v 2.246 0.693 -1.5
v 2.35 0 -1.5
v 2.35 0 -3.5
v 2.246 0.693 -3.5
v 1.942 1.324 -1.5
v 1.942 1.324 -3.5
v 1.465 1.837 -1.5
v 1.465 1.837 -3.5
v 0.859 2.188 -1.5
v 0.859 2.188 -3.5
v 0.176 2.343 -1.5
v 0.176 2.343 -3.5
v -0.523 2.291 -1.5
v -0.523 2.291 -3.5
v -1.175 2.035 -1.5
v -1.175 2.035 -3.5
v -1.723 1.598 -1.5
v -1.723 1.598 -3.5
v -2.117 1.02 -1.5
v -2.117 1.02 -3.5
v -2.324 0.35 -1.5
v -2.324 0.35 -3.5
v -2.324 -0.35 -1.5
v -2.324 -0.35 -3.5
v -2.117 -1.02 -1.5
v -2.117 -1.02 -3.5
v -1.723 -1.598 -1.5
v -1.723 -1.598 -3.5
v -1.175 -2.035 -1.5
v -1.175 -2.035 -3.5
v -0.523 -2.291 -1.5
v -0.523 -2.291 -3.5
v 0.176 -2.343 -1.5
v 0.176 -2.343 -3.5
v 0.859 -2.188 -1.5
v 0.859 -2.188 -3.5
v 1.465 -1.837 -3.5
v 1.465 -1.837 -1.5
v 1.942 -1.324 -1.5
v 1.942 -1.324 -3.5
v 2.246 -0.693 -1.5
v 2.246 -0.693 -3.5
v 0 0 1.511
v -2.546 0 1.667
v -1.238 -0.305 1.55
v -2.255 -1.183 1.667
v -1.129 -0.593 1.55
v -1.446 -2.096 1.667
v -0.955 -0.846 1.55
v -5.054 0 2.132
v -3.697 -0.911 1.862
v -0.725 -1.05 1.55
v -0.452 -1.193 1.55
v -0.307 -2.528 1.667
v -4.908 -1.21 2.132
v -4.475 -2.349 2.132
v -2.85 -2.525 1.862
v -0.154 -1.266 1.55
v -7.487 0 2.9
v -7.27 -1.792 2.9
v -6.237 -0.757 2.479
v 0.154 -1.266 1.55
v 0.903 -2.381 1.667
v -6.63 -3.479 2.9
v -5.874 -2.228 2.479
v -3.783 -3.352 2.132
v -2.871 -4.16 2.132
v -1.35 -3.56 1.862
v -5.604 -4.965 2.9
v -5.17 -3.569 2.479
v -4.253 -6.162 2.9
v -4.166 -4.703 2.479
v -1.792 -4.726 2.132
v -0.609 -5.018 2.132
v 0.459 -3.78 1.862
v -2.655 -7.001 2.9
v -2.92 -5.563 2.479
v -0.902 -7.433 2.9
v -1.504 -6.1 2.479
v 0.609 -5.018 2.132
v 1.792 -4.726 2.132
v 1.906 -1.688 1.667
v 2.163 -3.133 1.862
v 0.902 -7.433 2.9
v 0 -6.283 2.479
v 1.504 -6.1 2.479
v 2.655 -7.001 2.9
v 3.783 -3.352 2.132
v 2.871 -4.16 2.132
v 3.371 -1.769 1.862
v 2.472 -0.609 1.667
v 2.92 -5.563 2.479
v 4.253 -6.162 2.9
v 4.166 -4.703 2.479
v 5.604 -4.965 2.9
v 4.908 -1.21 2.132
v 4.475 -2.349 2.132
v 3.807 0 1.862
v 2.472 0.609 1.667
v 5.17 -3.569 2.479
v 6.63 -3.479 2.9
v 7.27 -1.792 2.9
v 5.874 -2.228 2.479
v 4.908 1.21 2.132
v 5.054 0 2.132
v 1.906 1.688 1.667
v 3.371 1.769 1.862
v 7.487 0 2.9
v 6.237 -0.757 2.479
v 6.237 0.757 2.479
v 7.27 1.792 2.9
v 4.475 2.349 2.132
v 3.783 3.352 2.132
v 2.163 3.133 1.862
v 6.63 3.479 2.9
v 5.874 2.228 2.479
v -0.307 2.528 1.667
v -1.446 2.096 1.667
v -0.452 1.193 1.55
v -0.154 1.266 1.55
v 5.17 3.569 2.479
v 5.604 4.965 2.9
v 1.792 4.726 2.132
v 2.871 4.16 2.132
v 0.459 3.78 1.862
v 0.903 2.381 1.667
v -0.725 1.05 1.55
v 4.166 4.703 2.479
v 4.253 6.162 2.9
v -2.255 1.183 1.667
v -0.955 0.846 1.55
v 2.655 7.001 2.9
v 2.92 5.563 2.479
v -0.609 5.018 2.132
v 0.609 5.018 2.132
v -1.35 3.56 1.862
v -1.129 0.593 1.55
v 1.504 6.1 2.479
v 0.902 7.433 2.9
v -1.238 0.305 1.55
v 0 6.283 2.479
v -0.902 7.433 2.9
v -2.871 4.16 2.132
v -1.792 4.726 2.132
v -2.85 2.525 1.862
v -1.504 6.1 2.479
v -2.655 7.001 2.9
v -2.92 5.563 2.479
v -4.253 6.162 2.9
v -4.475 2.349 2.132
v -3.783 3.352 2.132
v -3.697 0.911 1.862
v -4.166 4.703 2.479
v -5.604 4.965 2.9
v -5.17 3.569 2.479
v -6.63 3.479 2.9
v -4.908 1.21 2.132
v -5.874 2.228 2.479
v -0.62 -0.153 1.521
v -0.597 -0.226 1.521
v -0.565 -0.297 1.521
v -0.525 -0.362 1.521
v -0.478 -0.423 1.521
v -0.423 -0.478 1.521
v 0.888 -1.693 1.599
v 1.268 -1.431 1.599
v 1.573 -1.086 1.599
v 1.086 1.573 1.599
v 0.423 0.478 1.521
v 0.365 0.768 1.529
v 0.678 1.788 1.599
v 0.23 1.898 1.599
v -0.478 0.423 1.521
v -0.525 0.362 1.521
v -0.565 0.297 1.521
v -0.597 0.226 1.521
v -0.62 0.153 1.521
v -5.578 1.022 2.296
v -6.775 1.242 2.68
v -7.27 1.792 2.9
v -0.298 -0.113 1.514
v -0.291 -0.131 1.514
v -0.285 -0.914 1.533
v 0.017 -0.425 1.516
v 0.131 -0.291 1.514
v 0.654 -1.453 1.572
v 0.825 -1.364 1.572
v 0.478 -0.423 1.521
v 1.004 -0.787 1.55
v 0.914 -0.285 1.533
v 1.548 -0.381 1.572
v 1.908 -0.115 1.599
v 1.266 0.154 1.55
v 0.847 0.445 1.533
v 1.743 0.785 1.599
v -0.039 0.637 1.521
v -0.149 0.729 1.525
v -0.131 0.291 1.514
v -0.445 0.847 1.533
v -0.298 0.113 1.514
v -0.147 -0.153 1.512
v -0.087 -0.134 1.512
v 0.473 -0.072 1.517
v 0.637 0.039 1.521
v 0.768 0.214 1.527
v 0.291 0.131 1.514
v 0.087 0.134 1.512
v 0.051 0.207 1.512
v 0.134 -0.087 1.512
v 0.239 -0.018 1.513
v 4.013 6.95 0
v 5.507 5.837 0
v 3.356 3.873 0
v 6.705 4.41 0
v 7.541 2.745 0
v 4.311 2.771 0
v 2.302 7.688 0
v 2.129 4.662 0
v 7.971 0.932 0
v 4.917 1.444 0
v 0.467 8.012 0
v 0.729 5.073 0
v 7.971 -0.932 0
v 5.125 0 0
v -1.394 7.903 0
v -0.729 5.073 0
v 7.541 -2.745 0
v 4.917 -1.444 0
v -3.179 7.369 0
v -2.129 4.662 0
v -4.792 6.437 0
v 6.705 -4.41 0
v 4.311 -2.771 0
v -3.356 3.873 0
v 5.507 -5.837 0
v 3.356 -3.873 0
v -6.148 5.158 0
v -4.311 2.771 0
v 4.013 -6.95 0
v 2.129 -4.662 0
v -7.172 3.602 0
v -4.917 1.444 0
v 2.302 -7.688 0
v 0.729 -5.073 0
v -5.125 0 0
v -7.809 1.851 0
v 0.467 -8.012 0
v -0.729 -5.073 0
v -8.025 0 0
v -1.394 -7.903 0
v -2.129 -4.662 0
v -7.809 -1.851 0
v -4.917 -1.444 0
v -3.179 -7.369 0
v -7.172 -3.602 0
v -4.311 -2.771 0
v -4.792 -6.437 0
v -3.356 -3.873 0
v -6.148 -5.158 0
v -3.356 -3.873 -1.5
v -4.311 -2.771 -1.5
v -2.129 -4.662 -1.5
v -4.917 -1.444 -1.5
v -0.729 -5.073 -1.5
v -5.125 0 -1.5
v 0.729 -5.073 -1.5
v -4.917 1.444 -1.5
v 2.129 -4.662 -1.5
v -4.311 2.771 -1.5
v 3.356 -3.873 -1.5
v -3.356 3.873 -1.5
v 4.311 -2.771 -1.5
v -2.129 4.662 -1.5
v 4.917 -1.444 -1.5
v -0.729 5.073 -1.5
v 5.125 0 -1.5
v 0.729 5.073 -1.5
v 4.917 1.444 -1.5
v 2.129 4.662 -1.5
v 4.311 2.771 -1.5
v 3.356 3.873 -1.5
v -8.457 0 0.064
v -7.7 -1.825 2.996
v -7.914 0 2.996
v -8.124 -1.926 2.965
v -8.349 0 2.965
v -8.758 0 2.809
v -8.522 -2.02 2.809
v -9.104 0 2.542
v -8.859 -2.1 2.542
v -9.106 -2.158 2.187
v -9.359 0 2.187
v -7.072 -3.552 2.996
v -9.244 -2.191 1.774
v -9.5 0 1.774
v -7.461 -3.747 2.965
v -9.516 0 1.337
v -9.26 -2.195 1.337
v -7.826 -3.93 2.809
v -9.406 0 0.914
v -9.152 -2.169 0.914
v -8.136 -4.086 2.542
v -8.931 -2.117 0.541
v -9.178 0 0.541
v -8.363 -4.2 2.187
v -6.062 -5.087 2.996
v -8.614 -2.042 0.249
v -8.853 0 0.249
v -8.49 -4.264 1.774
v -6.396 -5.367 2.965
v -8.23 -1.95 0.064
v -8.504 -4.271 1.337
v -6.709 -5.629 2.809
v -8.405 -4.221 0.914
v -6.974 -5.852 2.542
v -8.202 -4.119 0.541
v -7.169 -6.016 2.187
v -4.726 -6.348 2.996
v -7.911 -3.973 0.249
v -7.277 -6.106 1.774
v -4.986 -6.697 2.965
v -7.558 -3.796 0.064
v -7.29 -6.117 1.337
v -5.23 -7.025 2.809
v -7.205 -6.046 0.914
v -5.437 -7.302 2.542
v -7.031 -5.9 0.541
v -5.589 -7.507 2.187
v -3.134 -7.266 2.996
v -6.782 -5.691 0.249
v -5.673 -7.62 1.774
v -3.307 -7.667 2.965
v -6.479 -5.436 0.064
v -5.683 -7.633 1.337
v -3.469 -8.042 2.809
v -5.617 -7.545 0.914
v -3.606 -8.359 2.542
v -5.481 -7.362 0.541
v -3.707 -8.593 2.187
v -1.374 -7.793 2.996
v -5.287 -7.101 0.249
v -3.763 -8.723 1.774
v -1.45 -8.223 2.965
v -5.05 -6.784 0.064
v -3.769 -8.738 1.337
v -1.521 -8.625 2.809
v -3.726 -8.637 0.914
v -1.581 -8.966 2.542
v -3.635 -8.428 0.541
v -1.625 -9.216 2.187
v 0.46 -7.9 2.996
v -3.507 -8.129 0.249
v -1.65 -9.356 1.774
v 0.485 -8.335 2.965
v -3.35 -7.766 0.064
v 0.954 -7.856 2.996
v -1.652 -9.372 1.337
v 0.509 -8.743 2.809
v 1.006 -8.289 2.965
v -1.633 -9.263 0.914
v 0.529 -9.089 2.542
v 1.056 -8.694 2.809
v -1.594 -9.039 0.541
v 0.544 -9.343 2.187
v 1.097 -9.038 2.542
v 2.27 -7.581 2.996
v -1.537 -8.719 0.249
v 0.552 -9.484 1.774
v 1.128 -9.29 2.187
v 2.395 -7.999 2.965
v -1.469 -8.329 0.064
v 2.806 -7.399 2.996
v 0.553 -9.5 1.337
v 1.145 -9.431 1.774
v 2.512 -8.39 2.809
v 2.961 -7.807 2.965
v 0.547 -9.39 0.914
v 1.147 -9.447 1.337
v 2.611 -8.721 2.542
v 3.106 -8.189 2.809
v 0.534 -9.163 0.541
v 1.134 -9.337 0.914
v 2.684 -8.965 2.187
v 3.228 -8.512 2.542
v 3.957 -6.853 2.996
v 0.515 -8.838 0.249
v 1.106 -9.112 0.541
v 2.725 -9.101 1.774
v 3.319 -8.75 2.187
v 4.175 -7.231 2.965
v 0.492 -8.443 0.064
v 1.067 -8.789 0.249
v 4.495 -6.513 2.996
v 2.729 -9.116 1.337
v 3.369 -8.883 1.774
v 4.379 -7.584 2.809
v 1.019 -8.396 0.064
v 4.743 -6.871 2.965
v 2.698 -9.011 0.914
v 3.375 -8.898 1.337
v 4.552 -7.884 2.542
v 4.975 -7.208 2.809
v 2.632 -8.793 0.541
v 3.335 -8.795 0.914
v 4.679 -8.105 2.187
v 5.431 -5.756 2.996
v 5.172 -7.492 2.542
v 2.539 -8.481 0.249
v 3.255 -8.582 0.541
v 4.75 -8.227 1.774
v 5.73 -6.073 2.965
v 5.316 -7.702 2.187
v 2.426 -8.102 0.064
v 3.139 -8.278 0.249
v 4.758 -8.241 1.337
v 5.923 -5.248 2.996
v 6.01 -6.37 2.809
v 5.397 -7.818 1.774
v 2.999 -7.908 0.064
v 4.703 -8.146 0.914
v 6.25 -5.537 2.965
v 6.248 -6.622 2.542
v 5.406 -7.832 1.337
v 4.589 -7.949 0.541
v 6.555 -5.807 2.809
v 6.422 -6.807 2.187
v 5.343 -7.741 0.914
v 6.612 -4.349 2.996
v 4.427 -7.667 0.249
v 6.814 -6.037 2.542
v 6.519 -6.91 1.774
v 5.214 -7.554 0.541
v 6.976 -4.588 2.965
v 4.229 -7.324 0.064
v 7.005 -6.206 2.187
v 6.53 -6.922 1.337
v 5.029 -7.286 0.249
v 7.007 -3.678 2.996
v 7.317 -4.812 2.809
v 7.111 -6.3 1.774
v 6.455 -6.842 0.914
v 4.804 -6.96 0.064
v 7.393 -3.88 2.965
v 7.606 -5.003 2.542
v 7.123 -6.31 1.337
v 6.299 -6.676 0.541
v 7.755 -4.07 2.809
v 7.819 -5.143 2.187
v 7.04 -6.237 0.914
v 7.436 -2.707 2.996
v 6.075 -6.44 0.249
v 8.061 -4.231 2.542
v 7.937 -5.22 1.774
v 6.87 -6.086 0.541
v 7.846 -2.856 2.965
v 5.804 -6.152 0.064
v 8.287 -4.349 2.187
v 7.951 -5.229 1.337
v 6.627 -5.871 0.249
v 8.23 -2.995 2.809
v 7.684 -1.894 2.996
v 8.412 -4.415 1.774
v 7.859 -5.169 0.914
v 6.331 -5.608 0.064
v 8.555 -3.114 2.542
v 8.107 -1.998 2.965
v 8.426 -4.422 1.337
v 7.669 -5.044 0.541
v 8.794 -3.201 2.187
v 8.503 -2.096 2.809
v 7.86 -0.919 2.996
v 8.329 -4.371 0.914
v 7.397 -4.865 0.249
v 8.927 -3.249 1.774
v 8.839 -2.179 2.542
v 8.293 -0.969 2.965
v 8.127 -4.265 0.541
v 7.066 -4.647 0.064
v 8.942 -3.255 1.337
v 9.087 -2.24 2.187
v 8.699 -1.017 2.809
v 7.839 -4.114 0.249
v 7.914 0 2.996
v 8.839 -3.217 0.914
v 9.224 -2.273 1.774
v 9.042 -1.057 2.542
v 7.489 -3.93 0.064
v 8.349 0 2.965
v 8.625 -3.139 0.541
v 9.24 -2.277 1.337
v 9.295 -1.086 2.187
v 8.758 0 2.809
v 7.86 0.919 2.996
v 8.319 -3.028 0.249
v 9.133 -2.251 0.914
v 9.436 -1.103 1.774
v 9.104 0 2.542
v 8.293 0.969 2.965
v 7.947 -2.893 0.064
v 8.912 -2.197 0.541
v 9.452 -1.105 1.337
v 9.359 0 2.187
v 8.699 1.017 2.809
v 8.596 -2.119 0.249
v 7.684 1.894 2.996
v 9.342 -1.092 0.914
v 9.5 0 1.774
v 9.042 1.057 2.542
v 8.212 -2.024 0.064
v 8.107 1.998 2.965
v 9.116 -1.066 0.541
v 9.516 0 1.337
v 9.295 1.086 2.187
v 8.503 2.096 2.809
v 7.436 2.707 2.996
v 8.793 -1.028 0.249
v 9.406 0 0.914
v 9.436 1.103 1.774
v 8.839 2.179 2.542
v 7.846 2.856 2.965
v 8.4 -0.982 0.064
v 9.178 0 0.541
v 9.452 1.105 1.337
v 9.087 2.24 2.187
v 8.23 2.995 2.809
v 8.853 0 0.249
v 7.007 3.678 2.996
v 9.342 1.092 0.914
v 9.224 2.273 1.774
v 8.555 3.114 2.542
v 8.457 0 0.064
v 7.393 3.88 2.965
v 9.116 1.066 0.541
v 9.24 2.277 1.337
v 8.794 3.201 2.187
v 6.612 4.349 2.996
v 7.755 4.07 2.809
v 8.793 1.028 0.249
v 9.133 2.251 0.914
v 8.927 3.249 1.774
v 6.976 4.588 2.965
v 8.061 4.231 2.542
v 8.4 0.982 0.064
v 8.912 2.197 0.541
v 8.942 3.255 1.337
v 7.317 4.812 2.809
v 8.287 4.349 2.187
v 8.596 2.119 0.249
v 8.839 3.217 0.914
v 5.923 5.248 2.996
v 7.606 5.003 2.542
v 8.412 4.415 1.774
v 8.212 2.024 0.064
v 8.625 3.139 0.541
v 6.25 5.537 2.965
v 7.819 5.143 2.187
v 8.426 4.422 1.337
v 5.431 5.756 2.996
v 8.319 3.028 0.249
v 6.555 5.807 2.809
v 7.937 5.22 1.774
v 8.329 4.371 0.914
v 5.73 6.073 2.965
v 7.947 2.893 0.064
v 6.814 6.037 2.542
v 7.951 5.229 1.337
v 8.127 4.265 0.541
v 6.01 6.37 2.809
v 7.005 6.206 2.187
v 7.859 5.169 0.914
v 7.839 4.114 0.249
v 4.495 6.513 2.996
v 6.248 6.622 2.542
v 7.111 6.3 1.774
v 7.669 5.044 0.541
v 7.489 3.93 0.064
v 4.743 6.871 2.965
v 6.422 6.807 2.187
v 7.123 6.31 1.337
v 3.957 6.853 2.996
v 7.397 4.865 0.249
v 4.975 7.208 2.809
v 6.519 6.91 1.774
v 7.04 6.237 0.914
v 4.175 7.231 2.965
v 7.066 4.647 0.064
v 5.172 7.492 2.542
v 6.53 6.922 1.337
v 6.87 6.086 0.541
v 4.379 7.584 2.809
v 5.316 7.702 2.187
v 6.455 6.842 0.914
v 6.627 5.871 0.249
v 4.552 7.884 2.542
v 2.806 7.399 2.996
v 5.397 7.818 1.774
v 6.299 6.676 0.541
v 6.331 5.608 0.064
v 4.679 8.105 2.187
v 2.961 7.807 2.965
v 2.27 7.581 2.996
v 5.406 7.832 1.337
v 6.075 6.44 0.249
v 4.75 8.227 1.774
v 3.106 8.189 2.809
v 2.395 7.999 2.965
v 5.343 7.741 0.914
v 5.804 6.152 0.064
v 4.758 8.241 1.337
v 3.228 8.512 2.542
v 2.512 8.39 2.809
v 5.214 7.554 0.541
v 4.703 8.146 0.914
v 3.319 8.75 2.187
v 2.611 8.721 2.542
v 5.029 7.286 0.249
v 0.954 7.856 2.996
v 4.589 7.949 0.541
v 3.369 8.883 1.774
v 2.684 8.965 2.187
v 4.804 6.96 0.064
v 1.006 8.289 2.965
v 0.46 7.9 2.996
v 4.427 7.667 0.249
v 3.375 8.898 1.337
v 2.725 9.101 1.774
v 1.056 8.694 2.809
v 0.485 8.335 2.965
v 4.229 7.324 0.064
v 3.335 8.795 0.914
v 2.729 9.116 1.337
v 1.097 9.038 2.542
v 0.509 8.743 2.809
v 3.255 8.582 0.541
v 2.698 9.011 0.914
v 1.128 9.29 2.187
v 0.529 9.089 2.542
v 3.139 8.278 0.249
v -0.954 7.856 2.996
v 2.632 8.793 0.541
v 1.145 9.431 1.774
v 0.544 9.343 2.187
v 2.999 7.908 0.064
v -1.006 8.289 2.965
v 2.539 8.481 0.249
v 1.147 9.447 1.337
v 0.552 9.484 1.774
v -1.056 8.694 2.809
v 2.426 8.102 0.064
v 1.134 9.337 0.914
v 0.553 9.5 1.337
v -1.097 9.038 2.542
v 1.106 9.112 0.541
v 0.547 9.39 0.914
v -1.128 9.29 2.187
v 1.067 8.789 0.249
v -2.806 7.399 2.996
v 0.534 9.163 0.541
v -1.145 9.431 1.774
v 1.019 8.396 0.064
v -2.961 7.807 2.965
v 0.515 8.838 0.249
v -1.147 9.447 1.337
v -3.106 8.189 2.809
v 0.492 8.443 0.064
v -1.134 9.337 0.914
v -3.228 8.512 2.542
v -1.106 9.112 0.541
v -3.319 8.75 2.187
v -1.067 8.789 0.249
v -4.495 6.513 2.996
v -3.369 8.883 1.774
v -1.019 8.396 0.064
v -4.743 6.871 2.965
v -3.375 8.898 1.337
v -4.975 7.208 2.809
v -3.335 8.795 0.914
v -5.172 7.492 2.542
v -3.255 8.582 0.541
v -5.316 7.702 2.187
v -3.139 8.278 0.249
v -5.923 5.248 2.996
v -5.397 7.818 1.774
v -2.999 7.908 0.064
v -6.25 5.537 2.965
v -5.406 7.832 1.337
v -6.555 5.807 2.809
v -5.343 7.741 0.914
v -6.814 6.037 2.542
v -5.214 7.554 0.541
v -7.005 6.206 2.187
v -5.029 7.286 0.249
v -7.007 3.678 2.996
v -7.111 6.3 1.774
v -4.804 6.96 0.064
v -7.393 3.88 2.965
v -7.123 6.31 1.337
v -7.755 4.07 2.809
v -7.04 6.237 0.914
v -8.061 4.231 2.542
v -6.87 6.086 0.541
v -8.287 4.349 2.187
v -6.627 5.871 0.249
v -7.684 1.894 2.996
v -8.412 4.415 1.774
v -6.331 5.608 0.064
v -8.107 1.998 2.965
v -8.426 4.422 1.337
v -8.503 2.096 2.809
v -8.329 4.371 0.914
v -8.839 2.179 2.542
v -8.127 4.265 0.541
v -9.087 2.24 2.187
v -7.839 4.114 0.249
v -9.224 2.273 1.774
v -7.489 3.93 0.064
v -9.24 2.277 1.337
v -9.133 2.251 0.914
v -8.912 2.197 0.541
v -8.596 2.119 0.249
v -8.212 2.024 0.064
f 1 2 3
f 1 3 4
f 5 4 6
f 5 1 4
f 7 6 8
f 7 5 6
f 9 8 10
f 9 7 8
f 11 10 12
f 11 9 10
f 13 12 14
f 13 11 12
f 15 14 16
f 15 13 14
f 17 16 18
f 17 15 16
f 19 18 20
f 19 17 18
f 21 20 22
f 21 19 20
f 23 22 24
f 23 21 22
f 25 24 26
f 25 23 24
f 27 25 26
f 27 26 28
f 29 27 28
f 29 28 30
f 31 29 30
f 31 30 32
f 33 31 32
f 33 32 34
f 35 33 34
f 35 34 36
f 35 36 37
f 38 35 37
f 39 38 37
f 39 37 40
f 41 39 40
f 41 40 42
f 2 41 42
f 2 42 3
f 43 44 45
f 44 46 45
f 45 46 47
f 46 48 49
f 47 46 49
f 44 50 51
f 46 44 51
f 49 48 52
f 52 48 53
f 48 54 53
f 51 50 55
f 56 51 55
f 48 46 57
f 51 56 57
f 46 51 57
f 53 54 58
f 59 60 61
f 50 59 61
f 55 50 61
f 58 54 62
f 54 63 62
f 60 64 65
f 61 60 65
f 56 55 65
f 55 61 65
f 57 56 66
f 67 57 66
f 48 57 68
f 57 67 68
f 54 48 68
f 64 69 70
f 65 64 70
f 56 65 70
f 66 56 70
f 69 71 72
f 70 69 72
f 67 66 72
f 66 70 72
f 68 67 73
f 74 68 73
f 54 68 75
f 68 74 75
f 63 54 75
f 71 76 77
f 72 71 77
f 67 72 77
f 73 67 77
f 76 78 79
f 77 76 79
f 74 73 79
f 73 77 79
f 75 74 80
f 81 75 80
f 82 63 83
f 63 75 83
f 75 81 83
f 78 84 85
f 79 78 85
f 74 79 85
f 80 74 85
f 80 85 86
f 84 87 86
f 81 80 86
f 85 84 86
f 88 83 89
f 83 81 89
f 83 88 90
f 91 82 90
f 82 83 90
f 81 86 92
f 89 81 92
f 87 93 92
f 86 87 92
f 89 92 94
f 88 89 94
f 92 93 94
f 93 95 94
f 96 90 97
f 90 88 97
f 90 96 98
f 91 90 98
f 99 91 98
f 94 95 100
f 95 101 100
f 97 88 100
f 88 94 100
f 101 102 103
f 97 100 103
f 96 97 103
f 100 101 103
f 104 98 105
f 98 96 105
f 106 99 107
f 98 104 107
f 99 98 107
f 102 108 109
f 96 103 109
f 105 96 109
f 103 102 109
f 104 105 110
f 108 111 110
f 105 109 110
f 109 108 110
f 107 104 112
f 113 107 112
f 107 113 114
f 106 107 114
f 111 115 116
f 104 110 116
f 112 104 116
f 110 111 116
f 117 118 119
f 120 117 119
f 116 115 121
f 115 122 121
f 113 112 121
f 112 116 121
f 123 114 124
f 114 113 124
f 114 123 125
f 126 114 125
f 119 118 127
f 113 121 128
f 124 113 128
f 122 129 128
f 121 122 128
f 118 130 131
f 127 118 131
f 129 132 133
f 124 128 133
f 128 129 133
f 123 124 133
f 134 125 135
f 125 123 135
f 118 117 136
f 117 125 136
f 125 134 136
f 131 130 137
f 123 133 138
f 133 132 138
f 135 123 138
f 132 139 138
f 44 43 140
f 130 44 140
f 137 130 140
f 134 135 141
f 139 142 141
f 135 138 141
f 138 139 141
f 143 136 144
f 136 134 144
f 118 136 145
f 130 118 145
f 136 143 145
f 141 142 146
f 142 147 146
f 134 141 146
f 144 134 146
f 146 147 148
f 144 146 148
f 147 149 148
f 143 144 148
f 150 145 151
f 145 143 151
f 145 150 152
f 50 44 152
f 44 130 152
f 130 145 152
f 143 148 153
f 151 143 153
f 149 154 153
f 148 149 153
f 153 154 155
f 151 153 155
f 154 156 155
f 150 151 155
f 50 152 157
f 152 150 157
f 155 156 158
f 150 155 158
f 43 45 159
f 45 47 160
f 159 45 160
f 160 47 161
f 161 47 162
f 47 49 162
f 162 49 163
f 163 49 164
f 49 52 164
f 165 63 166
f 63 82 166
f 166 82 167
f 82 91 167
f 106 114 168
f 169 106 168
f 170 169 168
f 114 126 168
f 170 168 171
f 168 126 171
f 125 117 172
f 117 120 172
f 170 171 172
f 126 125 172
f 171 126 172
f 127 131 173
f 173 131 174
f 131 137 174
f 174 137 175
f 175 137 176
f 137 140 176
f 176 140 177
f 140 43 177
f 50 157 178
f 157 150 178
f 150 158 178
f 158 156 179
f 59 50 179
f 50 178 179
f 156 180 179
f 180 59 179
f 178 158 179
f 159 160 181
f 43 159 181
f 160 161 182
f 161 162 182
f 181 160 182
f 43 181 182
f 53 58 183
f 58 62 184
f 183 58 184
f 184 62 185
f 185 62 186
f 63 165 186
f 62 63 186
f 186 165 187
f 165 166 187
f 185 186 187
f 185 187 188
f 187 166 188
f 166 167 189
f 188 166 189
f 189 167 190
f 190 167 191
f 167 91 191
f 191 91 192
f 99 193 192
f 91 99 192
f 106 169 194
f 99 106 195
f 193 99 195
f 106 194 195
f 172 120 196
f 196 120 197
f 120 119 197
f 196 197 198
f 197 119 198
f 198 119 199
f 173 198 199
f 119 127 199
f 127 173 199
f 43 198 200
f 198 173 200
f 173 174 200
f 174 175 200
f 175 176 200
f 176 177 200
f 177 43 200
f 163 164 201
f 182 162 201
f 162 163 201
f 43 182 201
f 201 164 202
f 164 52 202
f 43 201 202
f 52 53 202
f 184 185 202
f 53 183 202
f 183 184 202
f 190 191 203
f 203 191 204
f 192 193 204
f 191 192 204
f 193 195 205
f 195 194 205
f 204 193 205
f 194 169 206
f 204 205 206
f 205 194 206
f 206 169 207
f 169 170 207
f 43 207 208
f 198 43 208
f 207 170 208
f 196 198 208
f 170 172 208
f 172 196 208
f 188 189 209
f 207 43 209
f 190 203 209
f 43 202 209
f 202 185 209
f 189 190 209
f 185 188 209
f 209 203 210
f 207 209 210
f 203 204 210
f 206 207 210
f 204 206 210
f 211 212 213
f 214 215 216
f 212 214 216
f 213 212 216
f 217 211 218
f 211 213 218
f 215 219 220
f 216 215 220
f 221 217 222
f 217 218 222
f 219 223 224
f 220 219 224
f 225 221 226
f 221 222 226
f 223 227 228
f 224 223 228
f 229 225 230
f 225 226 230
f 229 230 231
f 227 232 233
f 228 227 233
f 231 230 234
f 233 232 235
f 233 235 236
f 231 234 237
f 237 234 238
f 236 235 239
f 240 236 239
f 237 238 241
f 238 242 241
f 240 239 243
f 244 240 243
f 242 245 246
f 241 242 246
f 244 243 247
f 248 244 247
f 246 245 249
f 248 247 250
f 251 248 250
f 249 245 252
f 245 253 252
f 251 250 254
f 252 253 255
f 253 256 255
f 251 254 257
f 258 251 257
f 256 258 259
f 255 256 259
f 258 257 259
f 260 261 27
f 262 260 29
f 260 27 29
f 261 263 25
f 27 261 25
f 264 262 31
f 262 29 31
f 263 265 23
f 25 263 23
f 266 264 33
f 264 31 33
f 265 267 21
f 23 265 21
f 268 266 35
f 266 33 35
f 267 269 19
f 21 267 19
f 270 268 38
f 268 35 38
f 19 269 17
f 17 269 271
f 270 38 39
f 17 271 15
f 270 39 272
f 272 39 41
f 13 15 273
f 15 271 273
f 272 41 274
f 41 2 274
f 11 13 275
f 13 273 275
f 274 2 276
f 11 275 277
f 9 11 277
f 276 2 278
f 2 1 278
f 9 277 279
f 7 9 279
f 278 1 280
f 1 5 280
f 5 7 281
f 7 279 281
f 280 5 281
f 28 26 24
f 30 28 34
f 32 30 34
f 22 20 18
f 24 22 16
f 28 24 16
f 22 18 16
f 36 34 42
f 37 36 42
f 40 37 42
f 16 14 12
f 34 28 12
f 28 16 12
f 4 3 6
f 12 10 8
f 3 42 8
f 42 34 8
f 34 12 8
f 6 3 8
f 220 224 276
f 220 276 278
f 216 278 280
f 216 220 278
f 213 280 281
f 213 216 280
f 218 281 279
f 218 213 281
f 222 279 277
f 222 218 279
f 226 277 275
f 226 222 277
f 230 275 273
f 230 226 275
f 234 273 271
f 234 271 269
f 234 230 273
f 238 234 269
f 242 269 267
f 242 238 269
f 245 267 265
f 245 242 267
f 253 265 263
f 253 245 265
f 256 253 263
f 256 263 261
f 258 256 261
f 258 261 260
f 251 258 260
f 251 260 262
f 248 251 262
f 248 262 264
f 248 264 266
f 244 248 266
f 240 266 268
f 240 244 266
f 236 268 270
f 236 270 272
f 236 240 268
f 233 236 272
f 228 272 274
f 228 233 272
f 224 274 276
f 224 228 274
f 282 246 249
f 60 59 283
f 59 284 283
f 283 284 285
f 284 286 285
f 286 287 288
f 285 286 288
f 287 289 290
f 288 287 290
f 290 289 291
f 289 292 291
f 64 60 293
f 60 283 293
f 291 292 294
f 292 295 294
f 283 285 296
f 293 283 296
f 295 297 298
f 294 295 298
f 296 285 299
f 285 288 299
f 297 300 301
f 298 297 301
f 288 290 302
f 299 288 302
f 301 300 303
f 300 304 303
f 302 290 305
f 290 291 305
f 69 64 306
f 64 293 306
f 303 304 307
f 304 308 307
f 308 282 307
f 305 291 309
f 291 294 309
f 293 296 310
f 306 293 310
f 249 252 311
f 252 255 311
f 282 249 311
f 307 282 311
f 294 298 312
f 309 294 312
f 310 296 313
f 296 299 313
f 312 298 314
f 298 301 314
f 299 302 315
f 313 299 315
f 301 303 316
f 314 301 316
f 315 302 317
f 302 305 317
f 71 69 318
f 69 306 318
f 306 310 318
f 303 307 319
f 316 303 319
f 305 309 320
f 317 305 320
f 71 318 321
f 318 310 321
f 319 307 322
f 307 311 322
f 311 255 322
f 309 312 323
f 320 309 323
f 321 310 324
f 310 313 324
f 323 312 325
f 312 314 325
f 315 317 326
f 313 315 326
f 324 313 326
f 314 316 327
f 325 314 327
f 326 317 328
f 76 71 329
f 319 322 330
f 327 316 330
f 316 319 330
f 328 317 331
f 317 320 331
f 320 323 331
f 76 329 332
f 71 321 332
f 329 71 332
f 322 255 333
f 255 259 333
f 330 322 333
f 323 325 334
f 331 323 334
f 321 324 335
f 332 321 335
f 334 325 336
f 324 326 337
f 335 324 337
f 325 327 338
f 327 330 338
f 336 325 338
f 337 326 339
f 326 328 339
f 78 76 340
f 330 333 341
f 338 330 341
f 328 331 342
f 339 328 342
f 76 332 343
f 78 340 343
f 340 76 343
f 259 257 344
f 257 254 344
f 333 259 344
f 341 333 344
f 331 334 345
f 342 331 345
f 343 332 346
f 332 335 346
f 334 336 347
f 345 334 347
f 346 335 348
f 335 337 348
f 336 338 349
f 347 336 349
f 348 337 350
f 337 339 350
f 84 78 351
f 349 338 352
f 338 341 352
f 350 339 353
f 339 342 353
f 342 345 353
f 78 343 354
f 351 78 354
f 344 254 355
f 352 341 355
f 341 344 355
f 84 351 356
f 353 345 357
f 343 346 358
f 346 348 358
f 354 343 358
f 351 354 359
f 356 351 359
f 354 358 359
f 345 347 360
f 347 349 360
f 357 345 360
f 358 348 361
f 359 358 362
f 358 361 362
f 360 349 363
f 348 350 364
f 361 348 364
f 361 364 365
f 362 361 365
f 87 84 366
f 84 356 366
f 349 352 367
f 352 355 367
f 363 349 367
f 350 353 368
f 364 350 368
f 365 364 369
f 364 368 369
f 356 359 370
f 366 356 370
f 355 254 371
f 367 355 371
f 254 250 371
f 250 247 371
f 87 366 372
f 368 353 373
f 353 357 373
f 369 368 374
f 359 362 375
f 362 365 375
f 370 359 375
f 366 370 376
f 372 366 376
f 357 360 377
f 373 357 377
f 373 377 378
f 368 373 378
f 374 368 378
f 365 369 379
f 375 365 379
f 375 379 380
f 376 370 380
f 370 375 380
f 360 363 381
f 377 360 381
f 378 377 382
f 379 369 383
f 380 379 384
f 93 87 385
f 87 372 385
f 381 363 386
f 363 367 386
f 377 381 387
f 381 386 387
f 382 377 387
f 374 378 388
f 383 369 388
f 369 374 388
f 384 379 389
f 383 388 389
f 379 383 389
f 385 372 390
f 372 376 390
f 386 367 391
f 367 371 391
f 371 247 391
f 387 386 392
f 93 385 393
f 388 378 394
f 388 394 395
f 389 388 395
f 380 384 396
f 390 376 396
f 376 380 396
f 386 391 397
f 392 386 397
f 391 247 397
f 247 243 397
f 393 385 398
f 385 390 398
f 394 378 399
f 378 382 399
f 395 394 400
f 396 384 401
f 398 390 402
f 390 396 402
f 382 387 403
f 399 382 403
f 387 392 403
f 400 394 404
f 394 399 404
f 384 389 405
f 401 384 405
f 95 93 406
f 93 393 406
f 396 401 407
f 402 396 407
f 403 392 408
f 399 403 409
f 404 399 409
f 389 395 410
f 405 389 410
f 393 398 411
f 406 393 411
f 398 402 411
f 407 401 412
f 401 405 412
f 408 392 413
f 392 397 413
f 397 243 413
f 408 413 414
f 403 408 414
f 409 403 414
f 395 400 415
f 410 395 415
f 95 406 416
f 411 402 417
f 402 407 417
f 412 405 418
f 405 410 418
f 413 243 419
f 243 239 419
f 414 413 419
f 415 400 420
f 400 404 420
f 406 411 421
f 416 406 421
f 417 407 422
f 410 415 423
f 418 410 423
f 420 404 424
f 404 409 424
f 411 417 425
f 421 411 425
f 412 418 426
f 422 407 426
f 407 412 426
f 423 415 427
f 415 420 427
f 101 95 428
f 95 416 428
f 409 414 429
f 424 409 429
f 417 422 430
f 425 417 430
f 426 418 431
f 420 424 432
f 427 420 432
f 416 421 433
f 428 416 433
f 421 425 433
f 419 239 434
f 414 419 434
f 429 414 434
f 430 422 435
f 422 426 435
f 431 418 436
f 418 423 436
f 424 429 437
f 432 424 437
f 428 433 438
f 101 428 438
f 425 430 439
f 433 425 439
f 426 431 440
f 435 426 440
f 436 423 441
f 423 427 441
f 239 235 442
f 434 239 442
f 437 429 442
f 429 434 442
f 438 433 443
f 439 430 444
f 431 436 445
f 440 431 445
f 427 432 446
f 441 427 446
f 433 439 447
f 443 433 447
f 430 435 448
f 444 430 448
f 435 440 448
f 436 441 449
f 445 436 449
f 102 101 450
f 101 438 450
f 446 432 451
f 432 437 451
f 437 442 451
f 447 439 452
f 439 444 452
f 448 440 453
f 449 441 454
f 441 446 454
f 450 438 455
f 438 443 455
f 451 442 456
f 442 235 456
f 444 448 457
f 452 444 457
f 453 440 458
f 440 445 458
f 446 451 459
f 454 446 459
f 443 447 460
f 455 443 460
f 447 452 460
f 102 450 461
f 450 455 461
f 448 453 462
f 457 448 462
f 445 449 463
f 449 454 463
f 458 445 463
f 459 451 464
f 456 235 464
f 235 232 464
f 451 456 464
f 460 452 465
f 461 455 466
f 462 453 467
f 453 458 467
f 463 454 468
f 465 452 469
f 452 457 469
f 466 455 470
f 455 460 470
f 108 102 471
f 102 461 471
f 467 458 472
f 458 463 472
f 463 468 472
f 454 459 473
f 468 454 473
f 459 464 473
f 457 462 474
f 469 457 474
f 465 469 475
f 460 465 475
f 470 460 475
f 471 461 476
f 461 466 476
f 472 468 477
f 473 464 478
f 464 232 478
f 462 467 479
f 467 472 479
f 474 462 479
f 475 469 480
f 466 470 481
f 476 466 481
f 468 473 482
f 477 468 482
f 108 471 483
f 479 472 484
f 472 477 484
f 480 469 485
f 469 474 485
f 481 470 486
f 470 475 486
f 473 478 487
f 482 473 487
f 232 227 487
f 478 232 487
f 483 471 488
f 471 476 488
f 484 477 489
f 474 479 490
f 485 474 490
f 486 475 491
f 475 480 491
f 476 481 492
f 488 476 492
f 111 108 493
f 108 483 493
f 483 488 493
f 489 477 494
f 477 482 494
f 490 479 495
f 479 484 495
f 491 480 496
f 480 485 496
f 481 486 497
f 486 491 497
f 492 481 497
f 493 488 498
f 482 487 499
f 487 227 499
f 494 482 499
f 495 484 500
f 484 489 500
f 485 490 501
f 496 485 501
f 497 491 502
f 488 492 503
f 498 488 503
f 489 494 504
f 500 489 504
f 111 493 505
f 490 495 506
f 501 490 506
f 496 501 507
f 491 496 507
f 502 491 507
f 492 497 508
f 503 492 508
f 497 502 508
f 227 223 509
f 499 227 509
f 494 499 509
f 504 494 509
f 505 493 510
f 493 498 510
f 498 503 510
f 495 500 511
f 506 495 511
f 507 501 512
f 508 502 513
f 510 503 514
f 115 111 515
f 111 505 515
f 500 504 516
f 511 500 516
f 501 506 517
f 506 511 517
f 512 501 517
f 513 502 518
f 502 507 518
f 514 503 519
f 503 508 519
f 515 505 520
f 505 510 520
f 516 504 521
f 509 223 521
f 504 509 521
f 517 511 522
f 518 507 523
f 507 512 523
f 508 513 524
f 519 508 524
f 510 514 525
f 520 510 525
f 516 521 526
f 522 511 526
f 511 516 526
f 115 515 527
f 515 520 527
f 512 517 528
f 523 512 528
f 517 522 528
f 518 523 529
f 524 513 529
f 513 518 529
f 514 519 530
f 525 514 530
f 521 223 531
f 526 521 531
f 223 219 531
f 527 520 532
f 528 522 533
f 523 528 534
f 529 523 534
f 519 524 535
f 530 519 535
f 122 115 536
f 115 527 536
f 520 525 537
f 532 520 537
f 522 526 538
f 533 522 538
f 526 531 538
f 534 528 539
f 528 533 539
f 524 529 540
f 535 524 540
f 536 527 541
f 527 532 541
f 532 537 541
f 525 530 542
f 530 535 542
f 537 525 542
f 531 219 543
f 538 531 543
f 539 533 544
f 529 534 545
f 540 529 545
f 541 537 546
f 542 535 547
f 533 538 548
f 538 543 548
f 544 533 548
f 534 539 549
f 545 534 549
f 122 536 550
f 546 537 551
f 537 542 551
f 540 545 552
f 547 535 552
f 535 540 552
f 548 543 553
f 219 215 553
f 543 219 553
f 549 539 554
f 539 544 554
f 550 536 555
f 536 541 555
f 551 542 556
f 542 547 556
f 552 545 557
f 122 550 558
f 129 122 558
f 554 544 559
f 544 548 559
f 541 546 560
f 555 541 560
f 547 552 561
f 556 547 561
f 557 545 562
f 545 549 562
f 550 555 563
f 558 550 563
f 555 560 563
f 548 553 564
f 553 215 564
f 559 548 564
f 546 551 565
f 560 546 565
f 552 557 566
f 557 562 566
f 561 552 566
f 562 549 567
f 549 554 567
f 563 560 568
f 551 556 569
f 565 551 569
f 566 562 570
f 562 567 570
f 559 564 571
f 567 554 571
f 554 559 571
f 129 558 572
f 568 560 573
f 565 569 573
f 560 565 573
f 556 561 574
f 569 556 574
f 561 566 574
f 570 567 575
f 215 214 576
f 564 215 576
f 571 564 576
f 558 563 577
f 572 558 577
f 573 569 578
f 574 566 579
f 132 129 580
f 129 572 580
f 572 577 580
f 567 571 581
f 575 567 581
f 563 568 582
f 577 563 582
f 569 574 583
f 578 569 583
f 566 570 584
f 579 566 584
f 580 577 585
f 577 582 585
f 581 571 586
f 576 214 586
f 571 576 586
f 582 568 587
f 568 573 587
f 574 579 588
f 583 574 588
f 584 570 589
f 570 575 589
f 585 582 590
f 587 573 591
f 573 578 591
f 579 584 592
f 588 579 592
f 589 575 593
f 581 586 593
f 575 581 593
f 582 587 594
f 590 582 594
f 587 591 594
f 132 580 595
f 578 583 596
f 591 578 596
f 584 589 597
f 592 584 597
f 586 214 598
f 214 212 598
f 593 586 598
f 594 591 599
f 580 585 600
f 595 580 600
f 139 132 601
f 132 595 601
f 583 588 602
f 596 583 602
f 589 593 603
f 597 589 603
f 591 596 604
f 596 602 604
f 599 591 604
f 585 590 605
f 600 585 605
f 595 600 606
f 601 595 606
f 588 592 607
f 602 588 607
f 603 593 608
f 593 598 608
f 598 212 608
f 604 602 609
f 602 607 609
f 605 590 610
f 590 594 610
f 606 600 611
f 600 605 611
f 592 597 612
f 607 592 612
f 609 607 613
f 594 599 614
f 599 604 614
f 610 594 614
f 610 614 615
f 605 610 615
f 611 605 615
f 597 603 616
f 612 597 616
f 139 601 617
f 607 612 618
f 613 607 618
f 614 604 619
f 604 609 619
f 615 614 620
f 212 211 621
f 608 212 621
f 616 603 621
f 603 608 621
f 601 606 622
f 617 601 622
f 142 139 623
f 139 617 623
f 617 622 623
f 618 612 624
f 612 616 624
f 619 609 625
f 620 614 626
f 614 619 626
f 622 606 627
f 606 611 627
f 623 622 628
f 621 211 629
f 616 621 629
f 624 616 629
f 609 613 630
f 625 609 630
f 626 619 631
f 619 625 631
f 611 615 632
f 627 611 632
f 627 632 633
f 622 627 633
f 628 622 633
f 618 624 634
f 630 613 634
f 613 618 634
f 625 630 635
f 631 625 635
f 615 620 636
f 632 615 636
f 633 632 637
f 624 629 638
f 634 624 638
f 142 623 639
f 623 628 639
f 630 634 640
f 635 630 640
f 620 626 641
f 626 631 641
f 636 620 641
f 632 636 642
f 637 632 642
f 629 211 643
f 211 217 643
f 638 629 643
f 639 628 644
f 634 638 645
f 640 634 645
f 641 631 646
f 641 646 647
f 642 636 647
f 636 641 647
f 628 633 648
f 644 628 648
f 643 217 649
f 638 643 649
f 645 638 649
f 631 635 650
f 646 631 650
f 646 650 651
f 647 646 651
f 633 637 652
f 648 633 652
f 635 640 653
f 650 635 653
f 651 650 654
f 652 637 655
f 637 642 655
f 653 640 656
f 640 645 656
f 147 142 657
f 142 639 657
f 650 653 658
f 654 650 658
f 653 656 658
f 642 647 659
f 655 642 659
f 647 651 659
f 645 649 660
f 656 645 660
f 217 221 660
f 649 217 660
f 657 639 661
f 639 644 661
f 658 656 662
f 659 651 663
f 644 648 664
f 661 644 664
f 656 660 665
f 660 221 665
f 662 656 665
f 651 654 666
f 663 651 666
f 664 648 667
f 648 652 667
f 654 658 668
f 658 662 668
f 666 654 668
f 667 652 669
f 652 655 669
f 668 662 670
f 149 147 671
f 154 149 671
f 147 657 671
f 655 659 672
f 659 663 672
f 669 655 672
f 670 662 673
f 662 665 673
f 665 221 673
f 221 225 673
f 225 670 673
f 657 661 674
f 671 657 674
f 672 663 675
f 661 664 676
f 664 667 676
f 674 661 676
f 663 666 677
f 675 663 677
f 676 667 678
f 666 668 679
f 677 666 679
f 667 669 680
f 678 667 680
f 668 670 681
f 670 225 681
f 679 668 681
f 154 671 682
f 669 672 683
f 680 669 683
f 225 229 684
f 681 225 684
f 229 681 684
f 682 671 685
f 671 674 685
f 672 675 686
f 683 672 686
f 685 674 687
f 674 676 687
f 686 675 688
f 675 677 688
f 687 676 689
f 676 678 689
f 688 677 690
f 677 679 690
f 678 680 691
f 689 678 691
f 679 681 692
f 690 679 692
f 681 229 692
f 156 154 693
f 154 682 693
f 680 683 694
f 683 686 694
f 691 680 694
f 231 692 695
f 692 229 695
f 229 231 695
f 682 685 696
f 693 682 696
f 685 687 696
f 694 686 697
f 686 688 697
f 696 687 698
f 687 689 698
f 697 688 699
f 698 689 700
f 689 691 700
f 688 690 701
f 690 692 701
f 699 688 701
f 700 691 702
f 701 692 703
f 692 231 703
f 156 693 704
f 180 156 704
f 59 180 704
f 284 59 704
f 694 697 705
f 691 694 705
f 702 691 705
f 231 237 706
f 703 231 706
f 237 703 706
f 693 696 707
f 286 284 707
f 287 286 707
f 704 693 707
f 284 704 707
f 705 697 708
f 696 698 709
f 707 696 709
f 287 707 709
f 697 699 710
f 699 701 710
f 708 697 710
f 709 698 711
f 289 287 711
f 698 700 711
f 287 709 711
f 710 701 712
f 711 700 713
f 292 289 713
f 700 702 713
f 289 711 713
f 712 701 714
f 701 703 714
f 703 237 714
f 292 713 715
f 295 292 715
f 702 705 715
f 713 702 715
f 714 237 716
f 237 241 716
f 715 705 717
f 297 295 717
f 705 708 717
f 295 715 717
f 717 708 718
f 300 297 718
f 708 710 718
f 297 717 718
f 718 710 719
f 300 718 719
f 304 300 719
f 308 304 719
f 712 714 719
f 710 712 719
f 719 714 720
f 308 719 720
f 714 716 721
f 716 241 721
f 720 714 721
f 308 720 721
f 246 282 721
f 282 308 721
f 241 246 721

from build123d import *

# Parameters (mm, degrees)
F2_R     = 5.125
F3_DEPTH = 1.5
F4_R     = 2.35
F5_DEPTH = 3.5


with BuildPart() as f1:
    # F0 (on Front) → F1 (revolve)
    with BuildSketch(Plane.XZ):
        with BuildLine():
            ThreePointArc((0, 1.511369), (-3.807453, 1.861515), (-7.487184, 2.900208))
            ThreePointArc((-7.487184, 2.900208), (-9.5, 1.773576), (-8.025159, 0))
            Line((-8.025159, 0), (0, 0))
            Line((0, 0), (0, 1.511369))
        make_face()
    revolve(axis=Axis((0, 0, 0.755685), (0, 0, 1)))

    # F2 (on Top) → F3 (join)
    with BuildSketch(Plane.XY):
        Circle(F2_R)
    extrude(amount=-F3_DEPTH)

    # F4 (on Top) → F5 (join)
    with BuildSketch(Plane.XY):
        Circle(F4_R)
    extrude(amount=-F5_DEPTH)


solid = f1.part
